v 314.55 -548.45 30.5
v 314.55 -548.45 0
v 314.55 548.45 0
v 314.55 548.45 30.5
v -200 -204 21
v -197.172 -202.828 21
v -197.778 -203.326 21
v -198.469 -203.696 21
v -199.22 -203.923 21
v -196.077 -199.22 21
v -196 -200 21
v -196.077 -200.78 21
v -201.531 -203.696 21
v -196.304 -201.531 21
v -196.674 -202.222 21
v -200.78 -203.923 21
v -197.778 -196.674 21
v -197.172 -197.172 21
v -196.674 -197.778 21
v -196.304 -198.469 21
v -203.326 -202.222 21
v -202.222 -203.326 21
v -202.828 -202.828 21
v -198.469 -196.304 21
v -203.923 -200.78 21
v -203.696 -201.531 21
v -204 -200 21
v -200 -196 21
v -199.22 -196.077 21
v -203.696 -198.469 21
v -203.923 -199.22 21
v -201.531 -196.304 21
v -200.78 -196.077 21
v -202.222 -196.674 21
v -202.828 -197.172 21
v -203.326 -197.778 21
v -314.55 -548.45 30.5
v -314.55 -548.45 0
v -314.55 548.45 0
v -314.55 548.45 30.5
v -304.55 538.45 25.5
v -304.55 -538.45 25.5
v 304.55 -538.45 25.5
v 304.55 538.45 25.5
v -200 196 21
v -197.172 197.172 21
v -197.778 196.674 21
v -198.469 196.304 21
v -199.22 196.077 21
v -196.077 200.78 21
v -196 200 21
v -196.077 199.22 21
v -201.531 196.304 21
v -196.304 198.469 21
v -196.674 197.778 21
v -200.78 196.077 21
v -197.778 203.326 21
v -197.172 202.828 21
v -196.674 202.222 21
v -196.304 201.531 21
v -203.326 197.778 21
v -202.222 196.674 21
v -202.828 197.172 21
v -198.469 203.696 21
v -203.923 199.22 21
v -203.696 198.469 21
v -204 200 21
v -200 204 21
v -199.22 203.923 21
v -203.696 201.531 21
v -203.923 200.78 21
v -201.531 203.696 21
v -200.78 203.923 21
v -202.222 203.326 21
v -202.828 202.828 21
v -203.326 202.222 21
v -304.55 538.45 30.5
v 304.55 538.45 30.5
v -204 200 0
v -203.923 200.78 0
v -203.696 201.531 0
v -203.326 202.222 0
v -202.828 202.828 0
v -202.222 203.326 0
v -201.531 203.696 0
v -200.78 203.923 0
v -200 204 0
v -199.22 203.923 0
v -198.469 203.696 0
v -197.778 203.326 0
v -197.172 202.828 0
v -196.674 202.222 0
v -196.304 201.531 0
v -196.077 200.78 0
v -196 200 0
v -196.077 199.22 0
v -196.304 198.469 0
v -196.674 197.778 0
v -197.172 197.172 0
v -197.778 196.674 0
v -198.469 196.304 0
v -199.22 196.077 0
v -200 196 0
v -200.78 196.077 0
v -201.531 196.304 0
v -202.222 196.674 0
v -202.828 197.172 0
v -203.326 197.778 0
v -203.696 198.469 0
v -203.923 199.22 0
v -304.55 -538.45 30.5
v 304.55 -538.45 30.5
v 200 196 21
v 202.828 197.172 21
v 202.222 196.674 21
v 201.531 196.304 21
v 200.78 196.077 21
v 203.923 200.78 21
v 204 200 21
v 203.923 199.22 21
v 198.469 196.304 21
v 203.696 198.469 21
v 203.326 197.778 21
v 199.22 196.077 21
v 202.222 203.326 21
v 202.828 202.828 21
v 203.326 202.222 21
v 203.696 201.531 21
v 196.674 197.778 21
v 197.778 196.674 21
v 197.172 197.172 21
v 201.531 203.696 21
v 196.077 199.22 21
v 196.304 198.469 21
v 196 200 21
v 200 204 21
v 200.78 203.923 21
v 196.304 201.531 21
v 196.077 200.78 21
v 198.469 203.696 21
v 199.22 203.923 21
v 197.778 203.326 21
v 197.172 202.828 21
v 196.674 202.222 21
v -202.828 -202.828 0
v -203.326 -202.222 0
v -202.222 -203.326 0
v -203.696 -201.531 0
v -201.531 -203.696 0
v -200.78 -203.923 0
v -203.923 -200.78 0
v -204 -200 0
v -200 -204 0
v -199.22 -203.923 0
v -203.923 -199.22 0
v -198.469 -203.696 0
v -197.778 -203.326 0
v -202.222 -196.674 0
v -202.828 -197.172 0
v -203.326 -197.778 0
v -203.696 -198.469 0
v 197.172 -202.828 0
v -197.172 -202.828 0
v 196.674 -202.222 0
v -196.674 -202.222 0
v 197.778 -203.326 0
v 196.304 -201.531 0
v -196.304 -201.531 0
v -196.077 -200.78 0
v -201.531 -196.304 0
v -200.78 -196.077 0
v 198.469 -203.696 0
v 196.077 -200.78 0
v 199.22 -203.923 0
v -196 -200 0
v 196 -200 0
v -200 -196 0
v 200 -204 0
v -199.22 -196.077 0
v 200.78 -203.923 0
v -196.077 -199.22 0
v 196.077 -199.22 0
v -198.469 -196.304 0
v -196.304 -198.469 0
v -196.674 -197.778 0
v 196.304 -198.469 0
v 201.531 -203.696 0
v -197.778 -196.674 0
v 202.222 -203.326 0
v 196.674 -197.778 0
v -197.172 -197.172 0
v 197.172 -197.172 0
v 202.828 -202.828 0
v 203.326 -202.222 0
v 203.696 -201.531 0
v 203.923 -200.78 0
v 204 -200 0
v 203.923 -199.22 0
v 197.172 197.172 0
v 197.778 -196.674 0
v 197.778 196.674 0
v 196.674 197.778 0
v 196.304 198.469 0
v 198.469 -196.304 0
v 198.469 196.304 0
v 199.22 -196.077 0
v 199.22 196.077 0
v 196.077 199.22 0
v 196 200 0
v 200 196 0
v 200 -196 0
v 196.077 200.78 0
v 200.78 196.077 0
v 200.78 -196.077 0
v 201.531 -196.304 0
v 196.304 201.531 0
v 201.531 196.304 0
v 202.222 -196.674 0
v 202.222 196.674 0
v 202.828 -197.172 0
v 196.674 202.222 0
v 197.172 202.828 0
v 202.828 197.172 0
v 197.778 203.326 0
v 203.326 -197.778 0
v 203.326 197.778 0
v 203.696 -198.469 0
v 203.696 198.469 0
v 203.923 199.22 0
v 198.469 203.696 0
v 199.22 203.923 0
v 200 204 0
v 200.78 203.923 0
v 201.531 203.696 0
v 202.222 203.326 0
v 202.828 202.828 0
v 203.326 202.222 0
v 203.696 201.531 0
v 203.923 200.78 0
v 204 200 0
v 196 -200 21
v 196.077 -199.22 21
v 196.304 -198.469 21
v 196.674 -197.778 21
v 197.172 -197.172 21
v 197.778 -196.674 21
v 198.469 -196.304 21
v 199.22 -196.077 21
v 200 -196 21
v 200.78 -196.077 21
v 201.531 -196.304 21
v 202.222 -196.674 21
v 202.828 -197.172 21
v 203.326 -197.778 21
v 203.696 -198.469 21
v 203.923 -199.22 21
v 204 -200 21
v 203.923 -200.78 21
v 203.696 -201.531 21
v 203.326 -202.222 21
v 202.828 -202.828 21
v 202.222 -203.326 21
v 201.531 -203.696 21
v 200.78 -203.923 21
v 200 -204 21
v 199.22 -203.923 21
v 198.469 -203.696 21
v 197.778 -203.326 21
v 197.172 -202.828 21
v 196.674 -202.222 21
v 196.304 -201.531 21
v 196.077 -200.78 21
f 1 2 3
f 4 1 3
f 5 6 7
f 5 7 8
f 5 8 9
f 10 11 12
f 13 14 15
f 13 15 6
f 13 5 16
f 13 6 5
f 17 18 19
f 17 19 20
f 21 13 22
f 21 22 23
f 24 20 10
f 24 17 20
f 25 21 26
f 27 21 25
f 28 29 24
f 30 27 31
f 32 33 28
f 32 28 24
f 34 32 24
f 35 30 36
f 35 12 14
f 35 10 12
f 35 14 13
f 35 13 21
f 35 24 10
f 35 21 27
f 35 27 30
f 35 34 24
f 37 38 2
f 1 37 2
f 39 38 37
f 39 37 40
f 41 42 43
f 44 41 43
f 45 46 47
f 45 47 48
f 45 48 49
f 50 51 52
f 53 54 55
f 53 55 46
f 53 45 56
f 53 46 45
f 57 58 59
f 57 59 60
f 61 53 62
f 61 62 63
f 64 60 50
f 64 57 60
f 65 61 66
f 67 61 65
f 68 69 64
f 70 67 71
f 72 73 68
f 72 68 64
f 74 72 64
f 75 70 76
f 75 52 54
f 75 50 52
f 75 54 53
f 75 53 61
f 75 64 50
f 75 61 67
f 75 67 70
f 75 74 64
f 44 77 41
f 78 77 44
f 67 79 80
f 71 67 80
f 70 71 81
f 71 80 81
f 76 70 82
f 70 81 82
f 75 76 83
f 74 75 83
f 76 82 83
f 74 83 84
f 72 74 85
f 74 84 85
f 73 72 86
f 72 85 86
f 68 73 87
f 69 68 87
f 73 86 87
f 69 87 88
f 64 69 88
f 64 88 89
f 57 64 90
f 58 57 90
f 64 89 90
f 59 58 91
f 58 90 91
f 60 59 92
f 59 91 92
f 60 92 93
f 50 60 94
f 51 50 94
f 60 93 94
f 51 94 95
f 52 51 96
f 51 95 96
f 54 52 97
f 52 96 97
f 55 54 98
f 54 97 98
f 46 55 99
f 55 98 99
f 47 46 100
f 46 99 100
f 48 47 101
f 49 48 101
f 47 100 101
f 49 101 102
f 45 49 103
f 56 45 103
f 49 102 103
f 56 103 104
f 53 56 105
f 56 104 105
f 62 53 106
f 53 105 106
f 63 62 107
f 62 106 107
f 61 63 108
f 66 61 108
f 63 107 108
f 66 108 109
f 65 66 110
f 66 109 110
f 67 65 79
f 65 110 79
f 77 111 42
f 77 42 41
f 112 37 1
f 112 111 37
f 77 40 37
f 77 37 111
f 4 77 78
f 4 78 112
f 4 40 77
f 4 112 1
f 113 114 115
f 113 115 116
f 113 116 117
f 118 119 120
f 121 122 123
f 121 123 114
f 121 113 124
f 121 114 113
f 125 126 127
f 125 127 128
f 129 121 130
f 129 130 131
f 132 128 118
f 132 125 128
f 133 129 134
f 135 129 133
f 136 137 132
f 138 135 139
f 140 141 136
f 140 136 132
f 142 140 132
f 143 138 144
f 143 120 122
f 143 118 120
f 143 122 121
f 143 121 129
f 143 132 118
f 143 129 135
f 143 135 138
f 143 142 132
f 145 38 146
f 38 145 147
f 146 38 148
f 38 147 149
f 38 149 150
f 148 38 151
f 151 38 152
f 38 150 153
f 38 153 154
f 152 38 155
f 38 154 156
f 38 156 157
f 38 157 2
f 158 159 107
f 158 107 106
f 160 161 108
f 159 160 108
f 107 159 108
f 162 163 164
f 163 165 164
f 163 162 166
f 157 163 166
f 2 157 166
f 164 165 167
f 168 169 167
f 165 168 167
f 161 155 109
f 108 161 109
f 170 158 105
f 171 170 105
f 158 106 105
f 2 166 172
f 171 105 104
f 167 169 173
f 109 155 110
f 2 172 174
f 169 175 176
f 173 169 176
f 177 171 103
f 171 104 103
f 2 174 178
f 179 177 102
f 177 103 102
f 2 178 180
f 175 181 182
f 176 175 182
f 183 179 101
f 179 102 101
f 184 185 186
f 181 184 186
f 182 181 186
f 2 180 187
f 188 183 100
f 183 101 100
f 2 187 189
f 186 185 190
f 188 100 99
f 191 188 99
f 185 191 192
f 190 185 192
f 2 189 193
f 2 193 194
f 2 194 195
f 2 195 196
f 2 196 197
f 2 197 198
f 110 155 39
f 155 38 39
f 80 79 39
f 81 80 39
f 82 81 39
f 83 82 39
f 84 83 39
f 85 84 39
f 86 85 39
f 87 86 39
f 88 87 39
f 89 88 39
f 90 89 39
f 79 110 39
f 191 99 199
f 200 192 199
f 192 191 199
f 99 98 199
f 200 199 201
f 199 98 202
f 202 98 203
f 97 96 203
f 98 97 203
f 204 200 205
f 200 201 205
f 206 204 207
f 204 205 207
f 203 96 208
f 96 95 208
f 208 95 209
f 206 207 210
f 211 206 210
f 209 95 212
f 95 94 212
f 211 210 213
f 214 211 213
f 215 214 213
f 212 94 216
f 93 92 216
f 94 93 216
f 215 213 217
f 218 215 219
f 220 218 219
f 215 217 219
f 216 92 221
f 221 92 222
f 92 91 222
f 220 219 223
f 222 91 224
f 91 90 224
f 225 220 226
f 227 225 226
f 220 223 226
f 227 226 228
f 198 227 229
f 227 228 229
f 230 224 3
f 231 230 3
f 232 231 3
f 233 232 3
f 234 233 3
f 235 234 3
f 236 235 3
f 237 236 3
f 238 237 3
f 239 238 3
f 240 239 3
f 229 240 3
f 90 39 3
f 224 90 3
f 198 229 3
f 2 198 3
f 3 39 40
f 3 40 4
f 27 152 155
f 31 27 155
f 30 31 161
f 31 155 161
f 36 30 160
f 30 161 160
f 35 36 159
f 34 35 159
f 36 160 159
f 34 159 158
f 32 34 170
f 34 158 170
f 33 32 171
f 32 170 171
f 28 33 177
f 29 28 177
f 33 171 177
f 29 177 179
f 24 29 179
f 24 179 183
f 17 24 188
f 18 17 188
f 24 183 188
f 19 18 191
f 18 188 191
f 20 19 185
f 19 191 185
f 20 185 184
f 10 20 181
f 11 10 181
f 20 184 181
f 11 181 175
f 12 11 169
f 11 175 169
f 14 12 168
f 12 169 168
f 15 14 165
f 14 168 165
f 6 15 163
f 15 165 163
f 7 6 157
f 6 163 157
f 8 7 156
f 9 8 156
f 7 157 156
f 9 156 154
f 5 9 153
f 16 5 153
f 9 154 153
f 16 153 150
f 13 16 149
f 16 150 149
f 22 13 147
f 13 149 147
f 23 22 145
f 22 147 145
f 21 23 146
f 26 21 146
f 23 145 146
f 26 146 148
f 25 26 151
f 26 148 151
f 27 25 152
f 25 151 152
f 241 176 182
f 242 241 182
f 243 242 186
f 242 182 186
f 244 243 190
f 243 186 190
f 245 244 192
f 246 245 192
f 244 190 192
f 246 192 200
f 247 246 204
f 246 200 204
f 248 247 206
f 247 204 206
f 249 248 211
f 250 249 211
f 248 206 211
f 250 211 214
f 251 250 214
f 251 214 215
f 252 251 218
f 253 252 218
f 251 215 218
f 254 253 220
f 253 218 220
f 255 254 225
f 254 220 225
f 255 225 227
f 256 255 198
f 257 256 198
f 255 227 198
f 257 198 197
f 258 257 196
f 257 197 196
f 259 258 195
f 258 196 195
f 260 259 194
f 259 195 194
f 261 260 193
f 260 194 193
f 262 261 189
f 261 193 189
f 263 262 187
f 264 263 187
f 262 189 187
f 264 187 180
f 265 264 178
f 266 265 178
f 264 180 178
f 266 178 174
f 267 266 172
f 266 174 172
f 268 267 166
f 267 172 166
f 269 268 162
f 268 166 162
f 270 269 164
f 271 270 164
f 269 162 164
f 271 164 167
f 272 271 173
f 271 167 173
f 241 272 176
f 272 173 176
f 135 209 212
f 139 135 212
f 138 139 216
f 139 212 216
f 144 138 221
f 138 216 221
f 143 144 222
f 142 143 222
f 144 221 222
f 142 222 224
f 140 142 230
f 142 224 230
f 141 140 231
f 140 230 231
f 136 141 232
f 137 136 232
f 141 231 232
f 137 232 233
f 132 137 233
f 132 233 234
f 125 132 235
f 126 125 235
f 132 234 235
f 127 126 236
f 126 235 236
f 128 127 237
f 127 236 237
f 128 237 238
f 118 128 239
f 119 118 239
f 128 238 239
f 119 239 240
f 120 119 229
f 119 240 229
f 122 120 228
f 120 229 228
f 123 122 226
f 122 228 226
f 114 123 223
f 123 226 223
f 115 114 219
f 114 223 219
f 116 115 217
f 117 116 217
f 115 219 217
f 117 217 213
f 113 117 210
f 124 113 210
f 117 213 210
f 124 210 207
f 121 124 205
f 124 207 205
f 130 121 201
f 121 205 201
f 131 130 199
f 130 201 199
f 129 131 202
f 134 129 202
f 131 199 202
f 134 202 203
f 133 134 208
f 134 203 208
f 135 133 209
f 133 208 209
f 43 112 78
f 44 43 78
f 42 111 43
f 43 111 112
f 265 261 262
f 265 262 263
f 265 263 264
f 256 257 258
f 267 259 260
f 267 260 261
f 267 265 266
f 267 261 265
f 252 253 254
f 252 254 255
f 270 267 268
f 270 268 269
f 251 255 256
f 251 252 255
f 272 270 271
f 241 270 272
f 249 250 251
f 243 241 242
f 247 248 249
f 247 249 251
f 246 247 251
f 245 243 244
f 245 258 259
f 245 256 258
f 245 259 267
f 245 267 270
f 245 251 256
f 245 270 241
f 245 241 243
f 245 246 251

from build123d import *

# Parameters (mm, degrees)
SKETCH1_W           = 629.1
SKETCH1_H           = 1096.9
BOSS_EXTRUDE1_DEPTH = 30.5
SKETCH2_R           = 4
CUT_EXTRUDE1_DEPTH  = 21
SKETCH3_W           = 609.1
SKETCH3_H           = 1076.9
CUT_EXTRUDE2_DEPTH  = 5


with BuildPart() as part:
    # Sketch1 → Boss-Extrude1 (new body)
    with BuildSketch(Plane.XY):
        Rectangle(SKETCH1_W, SKETCH1_H)
    extrude(amount=BOSS_EXTRUDE1_DEPTH)

    # Sketch2 → Cut-Extrude1 (cut)
    with BuildSketch(Plane(origin=(0, 0, 0), x_dir=(-1, 0, 0), z_dir=(0, 0, -1))):
        with Locations((-200, 200)):
            Circle(SKETCH2_R)
        with Locations((200, 200)):
            Circle(SKETCH2_R)
        with Locations((200, -200)):
            Circle(SKETCH2_R)
        with Locations((-200, -200)):
            Circle(SKETCH2_R)
    extrude(amount=-CUT_EXTRUDE1_DEPTH, mode=Mode.SUBTRACT)

    # Sketch3 → Cut-Extrude2 (cut)
    with BuildSketch(Plane.XY.offset(30.5)):
        Rectangle(SKETCH3_W, SKETCH3_H)
    extrude(amount=-CUT_EXTRUDE2_DEPTH, mode=Mode.SUBTRACT)


solid = part.part
